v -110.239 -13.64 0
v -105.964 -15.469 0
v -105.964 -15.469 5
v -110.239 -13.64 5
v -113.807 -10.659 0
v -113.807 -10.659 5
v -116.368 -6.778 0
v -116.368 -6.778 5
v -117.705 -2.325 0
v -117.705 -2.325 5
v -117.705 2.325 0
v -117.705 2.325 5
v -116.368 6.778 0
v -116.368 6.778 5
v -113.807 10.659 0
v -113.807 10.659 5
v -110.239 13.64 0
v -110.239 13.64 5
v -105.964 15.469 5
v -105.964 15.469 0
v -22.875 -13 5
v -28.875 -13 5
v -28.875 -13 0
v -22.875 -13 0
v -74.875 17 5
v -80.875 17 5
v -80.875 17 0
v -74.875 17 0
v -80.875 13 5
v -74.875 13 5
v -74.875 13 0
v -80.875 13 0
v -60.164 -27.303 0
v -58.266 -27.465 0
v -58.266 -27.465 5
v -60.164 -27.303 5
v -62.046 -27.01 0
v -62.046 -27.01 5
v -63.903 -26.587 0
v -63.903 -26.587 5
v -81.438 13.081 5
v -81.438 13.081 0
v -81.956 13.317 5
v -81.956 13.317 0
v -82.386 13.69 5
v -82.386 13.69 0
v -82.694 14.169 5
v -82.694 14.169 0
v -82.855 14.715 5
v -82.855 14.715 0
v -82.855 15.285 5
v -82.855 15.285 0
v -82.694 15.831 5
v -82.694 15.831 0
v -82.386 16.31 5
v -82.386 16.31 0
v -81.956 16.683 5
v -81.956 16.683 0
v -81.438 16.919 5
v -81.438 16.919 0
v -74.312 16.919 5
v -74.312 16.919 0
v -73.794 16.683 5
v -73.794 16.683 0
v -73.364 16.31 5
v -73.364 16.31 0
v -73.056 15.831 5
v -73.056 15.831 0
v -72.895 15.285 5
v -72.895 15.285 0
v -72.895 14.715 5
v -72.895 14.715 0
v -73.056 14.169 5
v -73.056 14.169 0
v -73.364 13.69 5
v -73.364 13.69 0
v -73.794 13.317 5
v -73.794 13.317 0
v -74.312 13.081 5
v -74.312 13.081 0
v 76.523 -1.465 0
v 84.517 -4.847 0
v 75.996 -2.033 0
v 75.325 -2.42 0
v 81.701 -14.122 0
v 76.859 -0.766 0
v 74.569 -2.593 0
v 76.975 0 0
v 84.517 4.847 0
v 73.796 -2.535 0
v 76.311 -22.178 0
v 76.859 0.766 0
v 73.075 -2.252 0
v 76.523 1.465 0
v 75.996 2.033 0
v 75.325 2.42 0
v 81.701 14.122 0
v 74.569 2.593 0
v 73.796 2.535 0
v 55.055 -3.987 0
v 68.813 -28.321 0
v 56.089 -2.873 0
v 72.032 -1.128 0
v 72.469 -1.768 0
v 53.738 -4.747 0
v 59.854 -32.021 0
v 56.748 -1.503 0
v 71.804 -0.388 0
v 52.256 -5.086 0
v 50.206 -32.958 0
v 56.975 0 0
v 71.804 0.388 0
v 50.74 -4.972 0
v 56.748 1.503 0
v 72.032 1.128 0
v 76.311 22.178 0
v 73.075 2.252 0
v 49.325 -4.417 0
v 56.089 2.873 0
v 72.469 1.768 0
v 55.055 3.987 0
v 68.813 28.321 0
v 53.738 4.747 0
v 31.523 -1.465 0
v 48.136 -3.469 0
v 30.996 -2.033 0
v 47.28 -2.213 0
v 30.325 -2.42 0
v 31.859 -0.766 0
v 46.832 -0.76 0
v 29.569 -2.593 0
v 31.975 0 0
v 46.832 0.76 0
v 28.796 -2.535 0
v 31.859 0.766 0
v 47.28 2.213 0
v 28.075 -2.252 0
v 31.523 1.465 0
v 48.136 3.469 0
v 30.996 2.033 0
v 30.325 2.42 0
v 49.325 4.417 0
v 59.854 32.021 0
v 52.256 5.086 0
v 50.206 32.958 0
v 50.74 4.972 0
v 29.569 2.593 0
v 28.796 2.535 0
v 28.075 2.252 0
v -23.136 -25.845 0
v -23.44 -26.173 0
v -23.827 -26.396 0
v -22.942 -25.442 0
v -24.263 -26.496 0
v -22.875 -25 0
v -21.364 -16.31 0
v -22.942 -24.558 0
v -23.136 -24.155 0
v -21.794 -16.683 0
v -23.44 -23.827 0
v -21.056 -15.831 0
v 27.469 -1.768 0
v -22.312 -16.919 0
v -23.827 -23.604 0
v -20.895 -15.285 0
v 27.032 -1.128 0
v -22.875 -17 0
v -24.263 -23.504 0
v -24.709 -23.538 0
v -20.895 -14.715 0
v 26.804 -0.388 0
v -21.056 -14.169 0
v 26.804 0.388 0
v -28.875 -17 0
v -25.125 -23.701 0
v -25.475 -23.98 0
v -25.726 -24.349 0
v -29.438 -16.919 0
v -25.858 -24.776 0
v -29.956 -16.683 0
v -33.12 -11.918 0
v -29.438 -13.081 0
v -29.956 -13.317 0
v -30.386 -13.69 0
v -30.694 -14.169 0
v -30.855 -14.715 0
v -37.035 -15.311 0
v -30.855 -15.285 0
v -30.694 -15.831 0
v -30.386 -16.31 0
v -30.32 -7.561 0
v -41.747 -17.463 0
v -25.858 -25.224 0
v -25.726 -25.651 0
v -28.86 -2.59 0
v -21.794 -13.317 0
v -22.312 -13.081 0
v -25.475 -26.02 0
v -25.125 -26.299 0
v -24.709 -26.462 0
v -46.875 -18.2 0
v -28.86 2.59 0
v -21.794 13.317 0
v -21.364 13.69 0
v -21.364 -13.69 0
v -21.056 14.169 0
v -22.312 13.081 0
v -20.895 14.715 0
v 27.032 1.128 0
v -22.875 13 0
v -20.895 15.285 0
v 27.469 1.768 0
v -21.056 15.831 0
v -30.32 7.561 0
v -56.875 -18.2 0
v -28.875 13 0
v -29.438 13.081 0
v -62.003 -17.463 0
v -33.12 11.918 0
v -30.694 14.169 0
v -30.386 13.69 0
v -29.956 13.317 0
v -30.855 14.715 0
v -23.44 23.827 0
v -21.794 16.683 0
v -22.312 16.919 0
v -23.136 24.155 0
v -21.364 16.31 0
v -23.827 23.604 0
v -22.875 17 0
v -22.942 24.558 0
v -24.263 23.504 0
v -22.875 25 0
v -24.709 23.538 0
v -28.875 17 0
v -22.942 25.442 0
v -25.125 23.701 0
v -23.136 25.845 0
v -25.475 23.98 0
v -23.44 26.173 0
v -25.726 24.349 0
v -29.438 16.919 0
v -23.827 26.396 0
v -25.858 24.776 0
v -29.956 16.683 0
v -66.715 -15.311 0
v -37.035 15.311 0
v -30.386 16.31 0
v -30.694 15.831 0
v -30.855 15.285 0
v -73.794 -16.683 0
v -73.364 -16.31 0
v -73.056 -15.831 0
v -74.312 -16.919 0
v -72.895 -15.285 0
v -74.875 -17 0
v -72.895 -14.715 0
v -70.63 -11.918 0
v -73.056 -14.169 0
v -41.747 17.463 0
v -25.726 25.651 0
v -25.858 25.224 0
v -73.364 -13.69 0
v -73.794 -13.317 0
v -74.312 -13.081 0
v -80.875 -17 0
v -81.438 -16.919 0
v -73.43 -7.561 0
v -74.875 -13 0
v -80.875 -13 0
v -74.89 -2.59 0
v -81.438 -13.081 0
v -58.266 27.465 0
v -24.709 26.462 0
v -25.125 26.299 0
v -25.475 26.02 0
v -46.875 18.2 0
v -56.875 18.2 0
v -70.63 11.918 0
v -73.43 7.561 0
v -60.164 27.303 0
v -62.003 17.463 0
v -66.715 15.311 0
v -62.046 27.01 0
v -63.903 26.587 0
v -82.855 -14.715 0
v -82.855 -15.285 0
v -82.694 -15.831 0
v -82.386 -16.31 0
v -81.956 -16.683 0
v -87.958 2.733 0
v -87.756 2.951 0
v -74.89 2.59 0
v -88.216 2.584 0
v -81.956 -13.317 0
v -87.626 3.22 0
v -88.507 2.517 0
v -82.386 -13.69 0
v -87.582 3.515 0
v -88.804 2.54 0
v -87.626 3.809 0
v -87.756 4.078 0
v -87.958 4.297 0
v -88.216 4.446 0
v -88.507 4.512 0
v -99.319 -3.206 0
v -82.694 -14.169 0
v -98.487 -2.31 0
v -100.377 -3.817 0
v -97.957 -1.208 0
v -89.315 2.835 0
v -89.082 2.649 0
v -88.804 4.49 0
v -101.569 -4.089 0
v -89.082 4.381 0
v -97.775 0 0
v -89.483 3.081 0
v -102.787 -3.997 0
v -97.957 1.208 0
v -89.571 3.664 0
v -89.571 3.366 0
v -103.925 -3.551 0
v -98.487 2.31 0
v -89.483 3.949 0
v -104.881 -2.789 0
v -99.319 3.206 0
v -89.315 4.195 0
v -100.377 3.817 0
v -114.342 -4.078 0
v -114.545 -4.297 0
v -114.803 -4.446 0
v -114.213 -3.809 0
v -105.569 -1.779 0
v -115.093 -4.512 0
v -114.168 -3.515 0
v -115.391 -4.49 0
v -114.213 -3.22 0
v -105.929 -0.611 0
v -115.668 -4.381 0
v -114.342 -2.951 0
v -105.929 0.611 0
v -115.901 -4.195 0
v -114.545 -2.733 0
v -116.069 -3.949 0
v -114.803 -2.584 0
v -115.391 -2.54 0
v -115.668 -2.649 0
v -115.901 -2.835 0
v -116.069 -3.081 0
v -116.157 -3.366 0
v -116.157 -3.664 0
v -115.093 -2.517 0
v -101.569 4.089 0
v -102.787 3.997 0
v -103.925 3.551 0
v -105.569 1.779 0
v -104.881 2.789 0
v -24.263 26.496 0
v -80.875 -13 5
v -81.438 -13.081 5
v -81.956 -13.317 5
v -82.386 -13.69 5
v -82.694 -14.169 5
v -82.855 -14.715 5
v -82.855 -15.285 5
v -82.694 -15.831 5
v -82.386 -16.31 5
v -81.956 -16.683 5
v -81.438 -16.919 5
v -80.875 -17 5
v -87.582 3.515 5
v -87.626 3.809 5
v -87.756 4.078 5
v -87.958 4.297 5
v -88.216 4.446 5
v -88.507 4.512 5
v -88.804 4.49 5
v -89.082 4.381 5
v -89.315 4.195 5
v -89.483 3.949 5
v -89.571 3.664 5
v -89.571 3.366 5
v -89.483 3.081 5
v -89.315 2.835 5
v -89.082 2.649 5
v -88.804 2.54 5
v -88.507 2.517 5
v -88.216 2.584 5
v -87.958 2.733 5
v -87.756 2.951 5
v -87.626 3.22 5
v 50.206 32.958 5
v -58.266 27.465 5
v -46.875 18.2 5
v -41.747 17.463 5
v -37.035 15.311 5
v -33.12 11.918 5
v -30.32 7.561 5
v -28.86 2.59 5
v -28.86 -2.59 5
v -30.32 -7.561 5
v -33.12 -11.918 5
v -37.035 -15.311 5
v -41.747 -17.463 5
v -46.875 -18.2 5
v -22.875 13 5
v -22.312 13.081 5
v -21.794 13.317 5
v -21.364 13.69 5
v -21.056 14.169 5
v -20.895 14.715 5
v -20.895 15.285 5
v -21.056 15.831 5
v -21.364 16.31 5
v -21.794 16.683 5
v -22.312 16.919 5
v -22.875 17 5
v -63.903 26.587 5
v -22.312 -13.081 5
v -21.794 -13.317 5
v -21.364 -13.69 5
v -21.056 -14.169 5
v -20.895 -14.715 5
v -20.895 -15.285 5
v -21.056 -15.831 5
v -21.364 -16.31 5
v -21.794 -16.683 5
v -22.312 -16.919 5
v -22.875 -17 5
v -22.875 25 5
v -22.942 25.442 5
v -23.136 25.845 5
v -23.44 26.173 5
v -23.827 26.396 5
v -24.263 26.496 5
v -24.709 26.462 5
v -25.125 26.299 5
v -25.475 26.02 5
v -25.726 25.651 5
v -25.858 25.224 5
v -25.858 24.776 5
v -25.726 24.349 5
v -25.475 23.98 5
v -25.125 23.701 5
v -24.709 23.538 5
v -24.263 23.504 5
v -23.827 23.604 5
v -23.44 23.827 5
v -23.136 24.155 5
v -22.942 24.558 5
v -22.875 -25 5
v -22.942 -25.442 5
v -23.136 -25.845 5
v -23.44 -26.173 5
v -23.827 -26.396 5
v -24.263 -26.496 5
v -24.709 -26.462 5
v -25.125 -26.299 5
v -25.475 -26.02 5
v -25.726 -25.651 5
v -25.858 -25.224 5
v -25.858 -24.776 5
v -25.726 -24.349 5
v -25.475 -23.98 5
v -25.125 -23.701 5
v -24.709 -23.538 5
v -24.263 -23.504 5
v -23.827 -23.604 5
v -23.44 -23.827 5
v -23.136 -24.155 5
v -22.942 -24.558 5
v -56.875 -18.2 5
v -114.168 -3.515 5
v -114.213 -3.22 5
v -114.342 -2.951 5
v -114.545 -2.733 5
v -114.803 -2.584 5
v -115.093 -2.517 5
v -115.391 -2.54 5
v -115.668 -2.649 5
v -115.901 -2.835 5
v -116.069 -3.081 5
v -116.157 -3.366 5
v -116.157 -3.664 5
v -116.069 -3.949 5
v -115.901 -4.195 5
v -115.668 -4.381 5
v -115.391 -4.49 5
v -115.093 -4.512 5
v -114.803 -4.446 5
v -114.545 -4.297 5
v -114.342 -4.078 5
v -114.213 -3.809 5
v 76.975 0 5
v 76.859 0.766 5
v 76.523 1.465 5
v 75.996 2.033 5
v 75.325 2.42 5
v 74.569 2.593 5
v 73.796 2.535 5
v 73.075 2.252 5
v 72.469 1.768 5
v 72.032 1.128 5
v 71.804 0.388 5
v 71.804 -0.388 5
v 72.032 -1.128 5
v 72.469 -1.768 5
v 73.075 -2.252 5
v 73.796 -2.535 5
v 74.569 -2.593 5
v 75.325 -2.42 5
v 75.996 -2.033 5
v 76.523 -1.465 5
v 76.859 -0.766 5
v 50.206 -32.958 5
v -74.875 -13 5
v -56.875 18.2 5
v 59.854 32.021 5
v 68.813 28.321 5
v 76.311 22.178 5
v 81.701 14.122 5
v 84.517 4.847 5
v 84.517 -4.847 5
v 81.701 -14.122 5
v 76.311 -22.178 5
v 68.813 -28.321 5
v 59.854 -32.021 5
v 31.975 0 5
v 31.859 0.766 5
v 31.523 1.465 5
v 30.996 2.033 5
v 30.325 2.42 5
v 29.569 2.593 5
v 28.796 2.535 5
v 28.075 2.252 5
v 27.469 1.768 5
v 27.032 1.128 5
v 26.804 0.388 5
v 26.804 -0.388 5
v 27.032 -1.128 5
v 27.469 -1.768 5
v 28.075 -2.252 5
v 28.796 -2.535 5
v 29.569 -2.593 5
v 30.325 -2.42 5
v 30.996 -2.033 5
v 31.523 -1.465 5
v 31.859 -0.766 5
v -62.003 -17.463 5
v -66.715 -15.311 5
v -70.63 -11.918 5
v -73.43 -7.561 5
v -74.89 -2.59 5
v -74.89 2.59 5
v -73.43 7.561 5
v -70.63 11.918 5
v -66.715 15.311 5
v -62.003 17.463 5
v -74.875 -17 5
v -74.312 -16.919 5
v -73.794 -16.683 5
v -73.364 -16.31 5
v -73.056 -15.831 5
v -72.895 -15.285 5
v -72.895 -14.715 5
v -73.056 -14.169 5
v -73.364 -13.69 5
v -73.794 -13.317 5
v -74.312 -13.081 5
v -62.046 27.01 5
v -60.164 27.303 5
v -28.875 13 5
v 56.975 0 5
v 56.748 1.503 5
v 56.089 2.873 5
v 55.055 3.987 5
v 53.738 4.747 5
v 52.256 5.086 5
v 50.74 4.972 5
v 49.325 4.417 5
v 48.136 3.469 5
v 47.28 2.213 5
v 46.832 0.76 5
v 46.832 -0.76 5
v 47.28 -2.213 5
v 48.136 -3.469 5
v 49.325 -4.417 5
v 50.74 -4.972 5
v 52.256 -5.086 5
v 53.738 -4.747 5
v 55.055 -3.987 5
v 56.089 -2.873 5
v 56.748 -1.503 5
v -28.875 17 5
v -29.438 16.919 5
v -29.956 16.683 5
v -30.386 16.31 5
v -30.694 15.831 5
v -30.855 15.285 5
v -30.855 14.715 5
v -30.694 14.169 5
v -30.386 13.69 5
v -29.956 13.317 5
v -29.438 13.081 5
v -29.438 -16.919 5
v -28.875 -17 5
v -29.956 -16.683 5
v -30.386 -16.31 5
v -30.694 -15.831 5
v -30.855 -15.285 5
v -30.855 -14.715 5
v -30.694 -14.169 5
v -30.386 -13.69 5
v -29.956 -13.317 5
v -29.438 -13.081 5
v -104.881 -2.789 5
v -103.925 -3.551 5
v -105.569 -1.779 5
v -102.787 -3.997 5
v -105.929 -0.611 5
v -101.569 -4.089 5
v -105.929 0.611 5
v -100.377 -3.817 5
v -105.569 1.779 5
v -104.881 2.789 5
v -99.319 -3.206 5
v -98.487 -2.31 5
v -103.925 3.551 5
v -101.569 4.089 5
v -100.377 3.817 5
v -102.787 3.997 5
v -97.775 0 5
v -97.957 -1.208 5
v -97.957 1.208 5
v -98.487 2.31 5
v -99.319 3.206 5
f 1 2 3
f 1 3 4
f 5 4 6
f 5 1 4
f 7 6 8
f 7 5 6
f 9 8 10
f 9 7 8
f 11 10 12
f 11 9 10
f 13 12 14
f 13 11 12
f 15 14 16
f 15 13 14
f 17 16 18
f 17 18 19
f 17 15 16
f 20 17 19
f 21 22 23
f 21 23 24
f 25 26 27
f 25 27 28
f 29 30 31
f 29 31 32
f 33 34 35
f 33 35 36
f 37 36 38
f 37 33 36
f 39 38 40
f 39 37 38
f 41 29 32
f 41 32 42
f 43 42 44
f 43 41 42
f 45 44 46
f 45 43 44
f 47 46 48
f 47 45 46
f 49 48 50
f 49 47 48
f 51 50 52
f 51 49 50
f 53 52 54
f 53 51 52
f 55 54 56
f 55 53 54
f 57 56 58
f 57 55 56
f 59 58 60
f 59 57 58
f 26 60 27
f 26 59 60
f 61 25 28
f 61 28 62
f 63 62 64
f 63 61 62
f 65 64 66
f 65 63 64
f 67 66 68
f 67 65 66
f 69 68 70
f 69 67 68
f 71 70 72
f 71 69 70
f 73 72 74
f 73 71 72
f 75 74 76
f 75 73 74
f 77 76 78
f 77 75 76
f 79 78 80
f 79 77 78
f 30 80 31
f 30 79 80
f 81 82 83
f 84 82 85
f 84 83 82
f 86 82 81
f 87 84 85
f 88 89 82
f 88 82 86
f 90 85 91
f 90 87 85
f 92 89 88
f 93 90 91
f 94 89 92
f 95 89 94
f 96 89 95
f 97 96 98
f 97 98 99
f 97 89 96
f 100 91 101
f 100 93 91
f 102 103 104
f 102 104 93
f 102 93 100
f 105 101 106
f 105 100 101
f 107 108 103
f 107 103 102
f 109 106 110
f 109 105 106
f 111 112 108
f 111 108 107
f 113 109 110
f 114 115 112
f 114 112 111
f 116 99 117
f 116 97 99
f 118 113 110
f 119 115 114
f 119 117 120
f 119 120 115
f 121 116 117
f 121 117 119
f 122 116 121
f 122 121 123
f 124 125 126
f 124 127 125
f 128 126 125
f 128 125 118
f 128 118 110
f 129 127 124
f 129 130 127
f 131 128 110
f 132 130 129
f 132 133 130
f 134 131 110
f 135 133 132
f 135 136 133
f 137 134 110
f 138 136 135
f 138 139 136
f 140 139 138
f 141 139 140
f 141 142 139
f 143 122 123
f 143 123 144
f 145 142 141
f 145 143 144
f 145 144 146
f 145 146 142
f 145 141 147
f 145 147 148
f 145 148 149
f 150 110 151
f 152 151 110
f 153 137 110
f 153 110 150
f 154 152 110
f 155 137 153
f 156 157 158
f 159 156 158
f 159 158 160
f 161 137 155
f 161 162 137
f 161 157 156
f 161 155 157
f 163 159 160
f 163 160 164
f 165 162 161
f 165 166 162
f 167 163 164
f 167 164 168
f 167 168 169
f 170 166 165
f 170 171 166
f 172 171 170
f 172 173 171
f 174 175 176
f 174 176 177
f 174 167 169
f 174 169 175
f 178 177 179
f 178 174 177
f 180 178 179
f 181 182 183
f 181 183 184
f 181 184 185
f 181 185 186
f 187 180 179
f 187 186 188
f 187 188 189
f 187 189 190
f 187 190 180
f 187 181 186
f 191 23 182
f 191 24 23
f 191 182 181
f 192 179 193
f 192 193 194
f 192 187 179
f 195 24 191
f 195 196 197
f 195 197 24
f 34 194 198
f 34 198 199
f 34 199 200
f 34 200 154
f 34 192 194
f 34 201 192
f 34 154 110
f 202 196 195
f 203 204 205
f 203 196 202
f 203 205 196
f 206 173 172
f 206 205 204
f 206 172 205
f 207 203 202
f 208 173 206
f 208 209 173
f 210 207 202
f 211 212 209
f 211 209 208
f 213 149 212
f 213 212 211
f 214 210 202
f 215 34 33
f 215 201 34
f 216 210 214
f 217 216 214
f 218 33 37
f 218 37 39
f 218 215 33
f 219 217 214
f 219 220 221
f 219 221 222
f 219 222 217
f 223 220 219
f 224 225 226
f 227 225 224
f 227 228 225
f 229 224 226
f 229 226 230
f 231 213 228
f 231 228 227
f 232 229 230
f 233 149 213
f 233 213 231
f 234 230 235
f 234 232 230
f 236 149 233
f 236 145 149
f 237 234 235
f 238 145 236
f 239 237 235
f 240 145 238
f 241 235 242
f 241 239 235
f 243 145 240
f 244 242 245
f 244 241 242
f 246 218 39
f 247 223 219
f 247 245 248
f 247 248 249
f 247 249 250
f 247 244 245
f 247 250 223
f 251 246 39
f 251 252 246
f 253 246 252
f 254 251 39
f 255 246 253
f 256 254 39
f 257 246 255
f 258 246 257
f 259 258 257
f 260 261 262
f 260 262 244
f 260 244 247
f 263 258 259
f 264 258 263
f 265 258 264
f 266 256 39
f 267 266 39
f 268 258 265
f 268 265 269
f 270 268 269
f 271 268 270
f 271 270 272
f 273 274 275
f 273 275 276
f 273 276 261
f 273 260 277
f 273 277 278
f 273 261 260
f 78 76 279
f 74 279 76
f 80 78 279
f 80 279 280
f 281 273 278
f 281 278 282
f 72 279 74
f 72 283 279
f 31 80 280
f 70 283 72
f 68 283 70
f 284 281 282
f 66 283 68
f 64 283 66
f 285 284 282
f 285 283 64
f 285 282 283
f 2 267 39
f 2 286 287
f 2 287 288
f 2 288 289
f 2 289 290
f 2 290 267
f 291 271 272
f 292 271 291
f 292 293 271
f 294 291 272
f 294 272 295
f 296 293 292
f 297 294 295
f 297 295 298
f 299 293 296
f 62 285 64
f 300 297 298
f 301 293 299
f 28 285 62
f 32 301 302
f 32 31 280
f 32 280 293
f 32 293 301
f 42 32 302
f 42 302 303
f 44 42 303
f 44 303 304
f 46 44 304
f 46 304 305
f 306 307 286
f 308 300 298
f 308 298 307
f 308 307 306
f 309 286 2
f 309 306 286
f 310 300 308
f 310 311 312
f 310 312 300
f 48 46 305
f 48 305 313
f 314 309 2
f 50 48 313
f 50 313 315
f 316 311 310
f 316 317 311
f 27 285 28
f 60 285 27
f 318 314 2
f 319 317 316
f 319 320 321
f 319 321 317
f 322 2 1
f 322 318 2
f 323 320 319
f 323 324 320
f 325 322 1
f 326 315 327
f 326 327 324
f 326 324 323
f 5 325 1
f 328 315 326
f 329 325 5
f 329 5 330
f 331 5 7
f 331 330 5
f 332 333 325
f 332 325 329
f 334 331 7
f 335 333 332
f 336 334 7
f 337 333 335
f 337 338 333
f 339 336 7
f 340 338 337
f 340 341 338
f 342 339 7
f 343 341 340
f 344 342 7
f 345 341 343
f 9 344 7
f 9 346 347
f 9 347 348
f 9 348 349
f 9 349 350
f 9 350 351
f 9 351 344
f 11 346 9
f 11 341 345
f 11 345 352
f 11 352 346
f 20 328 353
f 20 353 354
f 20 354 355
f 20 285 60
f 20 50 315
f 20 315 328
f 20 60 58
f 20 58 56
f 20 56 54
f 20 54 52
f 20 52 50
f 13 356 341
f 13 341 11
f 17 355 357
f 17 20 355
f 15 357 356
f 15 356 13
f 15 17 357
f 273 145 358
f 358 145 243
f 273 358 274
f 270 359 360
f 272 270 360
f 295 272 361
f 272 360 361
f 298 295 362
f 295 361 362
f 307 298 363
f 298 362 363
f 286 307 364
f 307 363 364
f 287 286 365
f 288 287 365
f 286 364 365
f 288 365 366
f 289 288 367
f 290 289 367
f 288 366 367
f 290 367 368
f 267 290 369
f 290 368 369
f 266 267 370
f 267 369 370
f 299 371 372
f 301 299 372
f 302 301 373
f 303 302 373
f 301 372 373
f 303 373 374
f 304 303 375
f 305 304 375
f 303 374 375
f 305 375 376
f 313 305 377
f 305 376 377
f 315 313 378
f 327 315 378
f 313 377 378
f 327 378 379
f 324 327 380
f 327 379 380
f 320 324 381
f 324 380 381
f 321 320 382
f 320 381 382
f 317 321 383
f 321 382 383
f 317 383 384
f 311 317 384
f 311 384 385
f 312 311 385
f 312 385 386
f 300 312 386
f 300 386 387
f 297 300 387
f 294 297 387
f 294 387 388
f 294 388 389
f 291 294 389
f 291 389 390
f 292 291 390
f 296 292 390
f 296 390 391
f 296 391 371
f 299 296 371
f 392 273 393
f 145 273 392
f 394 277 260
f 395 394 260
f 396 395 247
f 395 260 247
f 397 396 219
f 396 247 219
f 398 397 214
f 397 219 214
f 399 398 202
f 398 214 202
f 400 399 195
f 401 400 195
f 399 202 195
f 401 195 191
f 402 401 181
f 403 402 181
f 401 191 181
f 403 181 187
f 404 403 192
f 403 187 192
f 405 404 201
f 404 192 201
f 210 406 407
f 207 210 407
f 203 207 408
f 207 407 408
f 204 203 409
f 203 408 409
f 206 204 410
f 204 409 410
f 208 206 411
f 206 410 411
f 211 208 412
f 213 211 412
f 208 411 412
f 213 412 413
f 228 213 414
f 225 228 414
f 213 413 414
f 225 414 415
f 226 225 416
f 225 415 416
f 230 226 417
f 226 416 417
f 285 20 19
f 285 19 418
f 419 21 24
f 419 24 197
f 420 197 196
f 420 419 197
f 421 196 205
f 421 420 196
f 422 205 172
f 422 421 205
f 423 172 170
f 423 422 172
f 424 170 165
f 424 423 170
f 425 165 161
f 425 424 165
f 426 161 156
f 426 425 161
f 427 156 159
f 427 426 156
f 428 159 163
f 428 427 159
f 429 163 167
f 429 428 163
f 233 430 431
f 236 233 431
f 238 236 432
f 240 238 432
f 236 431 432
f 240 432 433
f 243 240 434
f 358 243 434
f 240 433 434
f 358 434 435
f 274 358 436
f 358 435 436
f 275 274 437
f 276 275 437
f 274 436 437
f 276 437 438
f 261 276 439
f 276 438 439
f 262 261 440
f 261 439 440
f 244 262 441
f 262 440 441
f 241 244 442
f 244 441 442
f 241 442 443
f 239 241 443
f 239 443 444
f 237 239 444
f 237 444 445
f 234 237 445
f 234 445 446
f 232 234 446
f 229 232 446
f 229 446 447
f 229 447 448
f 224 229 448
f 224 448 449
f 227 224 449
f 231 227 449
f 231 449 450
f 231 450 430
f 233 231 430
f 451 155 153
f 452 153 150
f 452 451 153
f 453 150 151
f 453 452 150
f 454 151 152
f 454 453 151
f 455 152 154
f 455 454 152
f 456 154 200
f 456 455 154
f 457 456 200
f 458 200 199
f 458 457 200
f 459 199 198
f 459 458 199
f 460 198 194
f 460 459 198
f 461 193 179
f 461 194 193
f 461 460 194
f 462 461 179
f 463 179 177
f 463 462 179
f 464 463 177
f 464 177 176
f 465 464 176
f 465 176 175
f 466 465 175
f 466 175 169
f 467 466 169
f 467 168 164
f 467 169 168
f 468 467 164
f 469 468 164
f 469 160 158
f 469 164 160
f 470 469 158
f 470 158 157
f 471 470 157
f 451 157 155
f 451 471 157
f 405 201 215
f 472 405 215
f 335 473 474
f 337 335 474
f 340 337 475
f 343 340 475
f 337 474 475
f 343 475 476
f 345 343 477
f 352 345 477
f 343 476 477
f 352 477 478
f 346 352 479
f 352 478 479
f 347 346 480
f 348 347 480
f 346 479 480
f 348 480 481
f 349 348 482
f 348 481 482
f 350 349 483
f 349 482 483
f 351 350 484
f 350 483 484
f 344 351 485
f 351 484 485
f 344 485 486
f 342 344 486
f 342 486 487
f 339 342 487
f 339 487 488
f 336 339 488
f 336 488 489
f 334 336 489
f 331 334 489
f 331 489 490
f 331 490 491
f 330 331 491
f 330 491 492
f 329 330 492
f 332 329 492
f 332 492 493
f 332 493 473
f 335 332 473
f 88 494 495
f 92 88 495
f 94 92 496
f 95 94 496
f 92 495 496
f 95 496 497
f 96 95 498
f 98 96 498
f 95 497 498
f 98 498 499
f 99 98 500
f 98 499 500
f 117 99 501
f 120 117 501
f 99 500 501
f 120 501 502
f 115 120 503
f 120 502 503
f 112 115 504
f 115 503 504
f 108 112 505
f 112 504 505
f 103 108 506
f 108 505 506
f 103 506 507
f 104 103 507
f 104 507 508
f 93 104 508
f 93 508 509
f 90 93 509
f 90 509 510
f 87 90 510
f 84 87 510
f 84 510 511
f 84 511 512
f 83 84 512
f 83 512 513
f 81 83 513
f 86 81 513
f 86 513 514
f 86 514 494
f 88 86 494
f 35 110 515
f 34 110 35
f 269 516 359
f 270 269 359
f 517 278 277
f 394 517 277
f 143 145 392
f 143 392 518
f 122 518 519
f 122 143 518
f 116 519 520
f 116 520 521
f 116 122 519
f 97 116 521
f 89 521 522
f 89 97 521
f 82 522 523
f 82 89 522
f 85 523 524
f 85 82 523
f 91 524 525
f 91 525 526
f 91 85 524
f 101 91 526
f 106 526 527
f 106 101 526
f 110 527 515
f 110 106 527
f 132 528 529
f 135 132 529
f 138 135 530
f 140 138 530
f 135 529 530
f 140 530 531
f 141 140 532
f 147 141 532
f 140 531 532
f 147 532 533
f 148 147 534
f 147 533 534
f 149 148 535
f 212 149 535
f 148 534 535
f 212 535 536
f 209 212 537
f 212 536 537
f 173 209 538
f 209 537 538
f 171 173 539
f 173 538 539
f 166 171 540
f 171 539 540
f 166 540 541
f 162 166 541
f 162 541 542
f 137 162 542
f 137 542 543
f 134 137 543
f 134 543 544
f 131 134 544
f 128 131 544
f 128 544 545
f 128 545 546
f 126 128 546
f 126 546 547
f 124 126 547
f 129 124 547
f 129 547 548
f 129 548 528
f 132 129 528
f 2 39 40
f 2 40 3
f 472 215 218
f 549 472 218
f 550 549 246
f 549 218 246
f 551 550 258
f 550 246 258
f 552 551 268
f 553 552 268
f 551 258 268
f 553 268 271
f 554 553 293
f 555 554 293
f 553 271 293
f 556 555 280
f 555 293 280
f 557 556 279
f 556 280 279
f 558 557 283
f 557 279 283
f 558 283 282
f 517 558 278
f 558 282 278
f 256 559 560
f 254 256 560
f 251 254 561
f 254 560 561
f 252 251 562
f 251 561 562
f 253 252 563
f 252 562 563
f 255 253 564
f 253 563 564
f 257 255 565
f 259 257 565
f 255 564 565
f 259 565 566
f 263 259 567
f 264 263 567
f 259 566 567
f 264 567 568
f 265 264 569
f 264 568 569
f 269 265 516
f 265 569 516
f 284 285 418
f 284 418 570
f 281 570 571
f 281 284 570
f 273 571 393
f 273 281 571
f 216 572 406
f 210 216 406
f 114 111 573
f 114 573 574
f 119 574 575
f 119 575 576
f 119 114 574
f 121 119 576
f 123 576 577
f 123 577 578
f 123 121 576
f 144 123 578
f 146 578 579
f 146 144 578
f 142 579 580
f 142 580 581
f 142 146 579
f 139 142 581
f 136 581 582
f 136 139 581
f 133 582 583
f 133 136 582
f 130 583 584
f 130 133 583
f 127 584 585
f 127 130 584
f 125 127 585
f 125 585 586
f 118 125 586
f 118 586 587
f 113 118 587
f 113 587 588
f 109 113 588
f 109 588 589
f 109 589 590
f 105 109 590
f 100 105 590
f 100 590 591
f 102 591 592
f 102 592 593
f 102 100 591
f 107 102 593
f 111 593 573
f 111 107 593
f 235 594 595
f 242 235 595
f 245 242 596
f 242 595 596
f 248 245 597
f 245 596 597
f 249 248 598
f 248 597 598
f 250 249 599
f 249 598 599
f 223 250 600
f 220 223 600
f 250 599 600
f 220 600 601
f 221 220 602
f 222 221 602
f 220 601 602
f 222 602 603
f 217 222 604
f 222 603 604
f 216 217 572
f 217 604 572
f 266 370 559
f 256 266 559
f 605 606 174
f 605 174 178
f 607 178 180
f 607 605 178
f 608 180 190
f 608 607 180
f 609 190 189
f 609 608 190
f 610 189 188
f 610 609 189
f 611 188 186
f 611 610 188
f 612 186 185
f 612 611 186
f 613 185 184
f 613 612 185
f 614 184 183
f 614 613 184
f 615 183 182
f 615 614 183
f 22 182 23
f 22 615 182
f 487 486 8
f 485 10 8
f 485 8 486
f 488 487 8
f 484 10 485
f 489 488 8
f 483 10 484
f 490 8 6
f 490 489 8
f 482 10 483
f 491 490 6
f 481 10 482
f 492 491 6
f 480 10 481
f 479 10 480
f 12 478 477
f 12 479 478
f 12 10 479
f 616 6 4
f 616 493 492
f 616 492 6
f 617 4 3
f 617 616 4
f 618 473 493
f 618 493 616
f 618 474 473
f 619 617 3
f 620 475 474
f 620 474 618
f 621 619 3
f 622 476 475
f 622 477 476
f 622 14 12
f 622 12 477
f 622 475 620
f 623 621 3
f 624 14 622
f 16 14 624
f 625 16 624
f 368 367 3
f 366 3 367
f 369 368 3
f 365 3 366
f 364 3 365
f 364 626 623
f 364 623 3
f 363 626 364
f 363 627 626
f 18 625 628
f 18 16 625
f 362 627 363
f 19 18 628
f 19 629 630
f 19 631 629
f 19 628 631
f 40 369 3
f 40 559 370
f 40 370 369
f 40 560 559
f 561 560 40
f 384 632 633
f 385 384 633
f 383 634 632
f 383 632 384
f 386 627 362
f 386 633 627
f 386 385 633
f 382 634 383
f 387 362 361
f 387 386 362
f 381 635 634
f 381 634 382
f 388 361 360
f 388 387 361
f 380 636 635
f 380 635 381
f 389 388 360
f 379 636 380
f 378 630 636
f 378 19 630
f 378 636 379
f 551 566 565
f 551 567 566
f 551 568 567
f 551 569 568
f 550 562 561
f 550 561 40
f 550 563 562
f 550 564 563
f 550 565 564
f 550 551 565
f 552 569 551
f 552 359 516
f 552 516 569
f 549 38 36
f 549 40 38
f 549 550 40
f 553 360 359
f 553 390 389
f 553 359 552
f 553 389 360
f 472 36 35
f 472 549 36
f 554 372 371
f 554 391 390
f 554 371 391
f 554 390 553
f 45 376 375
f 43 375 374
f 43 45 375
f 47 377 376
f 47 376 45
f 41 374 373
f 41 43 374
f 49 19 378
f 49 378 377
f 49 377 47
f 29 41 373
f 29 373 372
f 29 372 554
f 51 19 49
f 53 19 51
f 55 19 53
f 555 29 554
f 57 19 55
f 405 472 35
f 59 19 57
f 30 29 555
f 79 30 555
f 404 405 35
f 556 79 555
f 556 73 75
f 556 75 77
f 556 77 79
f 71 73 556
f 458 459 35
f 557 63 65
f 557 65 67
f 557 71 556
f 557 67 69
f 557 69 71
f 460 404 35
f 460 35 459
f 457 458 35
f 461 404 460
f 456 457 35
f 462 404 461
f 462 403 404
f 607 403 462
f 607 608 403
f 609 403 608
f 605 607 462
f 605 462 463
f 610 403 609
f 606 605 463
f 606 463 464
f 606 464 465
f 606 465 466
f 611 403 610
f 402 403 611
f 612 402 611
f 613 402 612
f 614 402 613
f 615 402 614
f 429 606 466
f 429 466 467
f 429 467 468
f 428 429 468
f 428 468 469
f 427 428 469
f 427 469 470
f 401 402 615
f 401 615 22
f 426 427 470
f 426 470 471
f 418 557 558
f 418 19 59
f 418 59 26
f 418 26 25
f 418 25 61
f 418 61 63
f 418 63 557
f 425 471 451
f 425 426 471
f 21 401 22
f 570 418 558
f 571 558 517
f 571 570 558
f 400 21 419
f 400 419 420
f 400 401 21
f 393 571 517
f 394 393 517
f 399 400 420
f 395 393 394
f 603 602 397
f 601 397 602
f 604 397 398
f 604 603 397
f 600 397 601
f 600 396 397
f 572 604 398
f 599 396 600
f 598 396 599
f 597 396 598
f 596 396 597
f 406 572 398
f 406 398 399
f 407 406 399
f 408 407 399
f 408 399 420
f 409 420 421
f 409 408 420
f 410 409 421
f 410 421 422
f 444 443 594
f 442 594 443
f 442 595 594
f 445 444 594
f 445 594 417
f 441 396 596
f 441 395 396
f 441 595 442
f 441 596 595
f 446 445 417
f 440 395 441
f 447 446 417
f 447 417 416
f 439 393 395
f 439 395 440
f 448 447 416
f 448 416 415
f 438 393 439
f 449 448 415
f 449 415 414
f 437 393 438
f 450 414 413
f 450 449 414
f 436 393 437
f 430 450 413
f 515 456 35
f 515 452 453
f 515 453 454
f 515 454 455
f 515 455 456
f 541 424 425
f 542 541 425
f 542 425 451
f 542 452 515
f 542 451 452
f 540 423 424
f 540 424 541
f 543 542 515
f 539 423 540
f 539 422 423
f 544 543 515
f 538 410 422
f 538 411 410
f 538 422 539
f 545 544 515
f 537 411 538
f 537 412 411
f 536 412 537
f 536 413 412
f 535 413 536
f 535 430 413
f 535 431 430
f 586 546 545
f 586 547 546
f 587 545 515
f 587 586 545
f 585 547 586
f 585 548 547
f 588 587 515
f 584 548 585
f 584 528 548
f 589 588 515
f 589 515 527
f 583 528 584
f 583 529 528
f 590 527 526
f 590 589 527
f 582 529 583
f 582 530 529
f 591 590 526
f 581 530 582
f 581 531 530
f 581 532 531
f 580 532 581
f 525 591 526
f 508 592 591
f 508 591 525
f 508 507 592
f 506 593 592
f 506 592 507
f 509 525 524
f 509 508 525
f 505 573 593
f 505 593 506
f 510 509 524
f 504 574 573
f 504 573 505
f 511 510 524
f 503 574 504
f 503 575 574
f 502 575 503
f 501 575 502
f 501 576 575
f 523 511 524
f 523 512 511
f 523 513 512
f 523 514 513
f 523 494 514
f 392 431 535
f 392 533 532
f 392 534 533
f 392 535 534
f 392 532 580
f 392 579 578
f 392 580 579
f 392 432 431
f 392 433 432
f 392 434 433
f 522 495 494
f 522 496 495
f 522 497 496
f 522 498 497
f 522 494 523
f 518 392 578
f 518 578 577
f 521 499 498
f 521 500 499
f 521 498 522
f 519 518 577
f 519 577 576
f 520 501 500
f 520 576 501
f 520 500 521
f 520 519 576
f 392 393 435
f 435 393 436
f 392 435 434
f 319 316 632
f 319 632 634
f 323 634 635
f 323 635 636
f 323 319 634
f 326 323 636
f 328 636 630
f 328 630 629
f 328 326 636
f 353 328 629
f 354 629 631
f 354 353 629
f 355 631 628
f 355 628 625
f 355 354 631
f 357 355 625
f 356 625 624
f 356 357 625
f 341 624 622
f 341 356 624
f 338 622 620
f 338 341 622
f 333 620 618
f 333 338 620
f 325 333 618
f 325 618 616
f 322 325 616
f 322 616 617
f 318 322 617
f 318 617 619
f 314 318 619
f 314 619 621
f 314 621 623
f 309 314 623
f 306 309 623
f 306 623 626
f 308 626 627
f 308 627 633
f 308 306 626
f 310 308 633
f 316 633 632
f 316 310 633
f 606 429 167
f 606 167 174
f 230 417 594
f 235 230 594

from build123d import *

# Parameters (mm, degrees)
SKETCH1_R           = 4.1
SKETCH1_R_2         = 5.1
BOSS_EXTRUDE1_DEPTH = 5
SKETCH7_R           = 2.6
CUT_EXTRUDE1_DEPTH  = 7
BOSS_EXTRUDE7_DEPTH = 8
SKETCH9_R           = 1.5
CUT_EXTRUDE2_DEPTH  = 7
CUT_EXTRUDE3_DEPTH  = 10
SKETCH11_R          = 1
CUT_EXTRUDE4_DEPTH  = 10
CUT_EXTRUDE5_START  = 5
CUT_EXTRUDE5_DEPTH  = 5


with BuildPart() as part:
    # Sketch1 → Boss-Extrude1 (new body)
    with BuildSketch(Plane.XY):
        with BuildLine():
            Line((50.206034483, 32.957769253), (-58.265804598, 27.46480771))
            ThreePointArc((-58.265804598, 27.46480771), (-61.107119662, 27.172397082), (-63.902777778, 26.586845234))
            Line((-63.902777778, 26.586845234), (-105.963888889, 15.468709954))
            ThreePointArc((-105.963888889, 15.468709954), (-117.875, 0), (-105.963888889, -15.468709954))
            Line((-105.963888889, -15.468709954), (-63.902777778, -26.586845234))
            ThreePointArc((-63.902777778, -26.586845234), (-61.107119662, -27.172397082), (-58.265804598, -27.46480771))
            Line((-58.265804598, -27.46480771), (50.206034483, -32.957769253))
            ThreePointArc((50.206034483, -32.957769253), (84.875, 0), (50.206034483, 32.957769253))
        make_face()
        with Locations((-101.875, 0)):
            Circle(SKETCH1_R, mode=Mode.SUBTRACT)
        with BuildLine():
            ThreePointArc((-46.875, 18.2), (-28.675, 0), (-46.875, -18.2))
            Line((-46.875, -18.2), (-56.875, -18.2))
            ThreePointArc((-56.875, -18.2), (-75.075, 0), (-56.875, 18.2))
            Line((-56.875, 18.2), (-46.875, 18.2))
        make_face(mode=Mode.SUBTRACT)
        with Locations((51.875, 0)):
            Circle(SKETCH1_R_2, mode=Mode.SUBTRACT)
    extrude(amount=BOSS_EXTRUDE1_DEPTH)

    # Sketch7 → Cut-Extrude1 (cut)
    with BuildSketch(Plane.XY.offset(5)):
        with Locations((29.375, 0)):
            Circle(SKETCH7_R)
        with Locations((74.375, 0)):
            Circle(SKETCH7_R)
    extrude(amount=-CUT_EXTRUDE1_DEPTH, mode=Mode.SUBTRACT)

    # Sketch8 → Boss-Extrude7 (add)
    with BuildSketch(Plane.XY.offset(5)):
        Polygon((-28.993802154, 25), (-26.684401077, 21), (-22.065598923, 21), (-19.756197846, 25), (-22.065598923, 29), (-26.684401077, 29), align=None)
        Polygon((-25.775, 27.424871131), (-27.175, 25), (-25.775, 22.575128869), (-22.975, 22.575128869), (-21.575, 25), (-22.975, 27.424871131), align=None, mode=Mode.SUBTRACT)
    extrude(amount=-BOSS_EXTRUDE7_DEPTH)

    # Sketch9 → Cut-Extrude2 (cut)
    with BuildSketch(Plane.XY.offset(5)):
        with Locations((-24.375, 25)):
            Circle(SKETCH9_R)
    cut_extrude2 = extrude(amount=-CUT_EXTRUDE2_DEPTH, mode=Mode.SUBTRACT)

    # Mirror2: Cut-Extrude2 across plane
    add(cut_extrude2.mirror(Plane.ZX), mode=Mode.SUBTRACT)

    # Sketch10 → Cut-Extrude3 (cut)
    with BuildSketch(Plane.XY.offset(5)):
        with BuildLine():
            Line((-80.875, 13), (-74.875, 13))
            ThreePointArc((-74.875, 13), (-72.875, 15), (-74.875, 17))
            Line((-74.875, 17), (-80.875, 17))
            ThreePointArc((-80.875, 17), (-82.875, 15), (-80.875, 13))
        make_face()
        with BuildLine():
            ThreePointArc((-74.875, -13), (-72.875, -15), (-74.875, -17))
            Line((-74.875, -17), (-80.875, -17))
            ThreePointArc((-80.875, -17), (-82.875, -15), (-80.875, -13))
            Line((-80.875, -13), (-74.875, -13))
        make_face()
        with BuildLine():
            Line((-22.875, -13), (-28.875, -13))
            ThreePointArc((-28.875, -13), (-30.875, -15), (-28.875, -17))
            Line((-28.875, -17), (-22.875, -17))
            ThreePointArc((-22.875, -17), (-20.875, -15), (-22.875, -13))
        make_face()
        with BuildLine():
            ThreePointArc((-28.875, 13), (-30.875, 15), (-28.875, 17))
            Line((-28.875, 17), (-22.875, 17))
            ThreePointArc((-22.875, 17), (-20.875, 15), (-22.875, 13))
            Line((-22.875, 13), (-28.875, 13))
        make_face()
    extrude(amount=-CUT_EXTRUDE3_DEPTH, mode=Mode.SUBTRACT)

    # Sketch11 → Cut-Extrude4 (cut)
    with BuildSketch(Plane.XY.offset(5)):
        with Locations((-115.168208365, -3.514699328)):
            Circle(SKETCH11_R)
        with Locations((-88.581791635, 3.514699328)):
            Circle(SKETCH11_R)
    extrude(amount=-CUT_EXTRUDE4_DEPTH, mode=Mode.SUBTRACT)

    # Sketch12 → Cut-Extrude5 (cut)
    with BuildSketch(Plane(origin=(0, 0, 0), x_dir=(-1, 0, 0), z_dir=(0, 0, -1)).offset(CUT_EXTRUDE5_START)):
        with BuildLine():
            Line((105.963888889, 15.468709954), (63.902777778, 26.586845234))
            ThreePointArc((63.902777778, 26.586845234), (61.107119662, 27.172397082), (58.265804598, 27.46480771))
            Line((58.265804598, 27.46480771), (-50.206034483, 32.957769253))
            ThreePointArc((-50.206034483, 32.957769253), (-84.875, 0), (-50.206034483, -32.957769253))
            Line((-50.206034483, -32.957769253), (58.265804598, -27.46480771))
            ThreePointArc((58.265804598, -27.46480771), (61.107119662, -27.172397082), (63.902777778, -26.586845234))
            Line((63.902777778, -26.586845234), (105.963888889, -15.468709954))
            ThreePointArc((105.963888889, -15.468709954), (117.875, 0), (105.963888889, 15.468709954))
        make_face()
    extrude(amount=-CUT_EXTRUDE5_DEPTH, mode=Mode.SUBTRACT)


solid = part.part
